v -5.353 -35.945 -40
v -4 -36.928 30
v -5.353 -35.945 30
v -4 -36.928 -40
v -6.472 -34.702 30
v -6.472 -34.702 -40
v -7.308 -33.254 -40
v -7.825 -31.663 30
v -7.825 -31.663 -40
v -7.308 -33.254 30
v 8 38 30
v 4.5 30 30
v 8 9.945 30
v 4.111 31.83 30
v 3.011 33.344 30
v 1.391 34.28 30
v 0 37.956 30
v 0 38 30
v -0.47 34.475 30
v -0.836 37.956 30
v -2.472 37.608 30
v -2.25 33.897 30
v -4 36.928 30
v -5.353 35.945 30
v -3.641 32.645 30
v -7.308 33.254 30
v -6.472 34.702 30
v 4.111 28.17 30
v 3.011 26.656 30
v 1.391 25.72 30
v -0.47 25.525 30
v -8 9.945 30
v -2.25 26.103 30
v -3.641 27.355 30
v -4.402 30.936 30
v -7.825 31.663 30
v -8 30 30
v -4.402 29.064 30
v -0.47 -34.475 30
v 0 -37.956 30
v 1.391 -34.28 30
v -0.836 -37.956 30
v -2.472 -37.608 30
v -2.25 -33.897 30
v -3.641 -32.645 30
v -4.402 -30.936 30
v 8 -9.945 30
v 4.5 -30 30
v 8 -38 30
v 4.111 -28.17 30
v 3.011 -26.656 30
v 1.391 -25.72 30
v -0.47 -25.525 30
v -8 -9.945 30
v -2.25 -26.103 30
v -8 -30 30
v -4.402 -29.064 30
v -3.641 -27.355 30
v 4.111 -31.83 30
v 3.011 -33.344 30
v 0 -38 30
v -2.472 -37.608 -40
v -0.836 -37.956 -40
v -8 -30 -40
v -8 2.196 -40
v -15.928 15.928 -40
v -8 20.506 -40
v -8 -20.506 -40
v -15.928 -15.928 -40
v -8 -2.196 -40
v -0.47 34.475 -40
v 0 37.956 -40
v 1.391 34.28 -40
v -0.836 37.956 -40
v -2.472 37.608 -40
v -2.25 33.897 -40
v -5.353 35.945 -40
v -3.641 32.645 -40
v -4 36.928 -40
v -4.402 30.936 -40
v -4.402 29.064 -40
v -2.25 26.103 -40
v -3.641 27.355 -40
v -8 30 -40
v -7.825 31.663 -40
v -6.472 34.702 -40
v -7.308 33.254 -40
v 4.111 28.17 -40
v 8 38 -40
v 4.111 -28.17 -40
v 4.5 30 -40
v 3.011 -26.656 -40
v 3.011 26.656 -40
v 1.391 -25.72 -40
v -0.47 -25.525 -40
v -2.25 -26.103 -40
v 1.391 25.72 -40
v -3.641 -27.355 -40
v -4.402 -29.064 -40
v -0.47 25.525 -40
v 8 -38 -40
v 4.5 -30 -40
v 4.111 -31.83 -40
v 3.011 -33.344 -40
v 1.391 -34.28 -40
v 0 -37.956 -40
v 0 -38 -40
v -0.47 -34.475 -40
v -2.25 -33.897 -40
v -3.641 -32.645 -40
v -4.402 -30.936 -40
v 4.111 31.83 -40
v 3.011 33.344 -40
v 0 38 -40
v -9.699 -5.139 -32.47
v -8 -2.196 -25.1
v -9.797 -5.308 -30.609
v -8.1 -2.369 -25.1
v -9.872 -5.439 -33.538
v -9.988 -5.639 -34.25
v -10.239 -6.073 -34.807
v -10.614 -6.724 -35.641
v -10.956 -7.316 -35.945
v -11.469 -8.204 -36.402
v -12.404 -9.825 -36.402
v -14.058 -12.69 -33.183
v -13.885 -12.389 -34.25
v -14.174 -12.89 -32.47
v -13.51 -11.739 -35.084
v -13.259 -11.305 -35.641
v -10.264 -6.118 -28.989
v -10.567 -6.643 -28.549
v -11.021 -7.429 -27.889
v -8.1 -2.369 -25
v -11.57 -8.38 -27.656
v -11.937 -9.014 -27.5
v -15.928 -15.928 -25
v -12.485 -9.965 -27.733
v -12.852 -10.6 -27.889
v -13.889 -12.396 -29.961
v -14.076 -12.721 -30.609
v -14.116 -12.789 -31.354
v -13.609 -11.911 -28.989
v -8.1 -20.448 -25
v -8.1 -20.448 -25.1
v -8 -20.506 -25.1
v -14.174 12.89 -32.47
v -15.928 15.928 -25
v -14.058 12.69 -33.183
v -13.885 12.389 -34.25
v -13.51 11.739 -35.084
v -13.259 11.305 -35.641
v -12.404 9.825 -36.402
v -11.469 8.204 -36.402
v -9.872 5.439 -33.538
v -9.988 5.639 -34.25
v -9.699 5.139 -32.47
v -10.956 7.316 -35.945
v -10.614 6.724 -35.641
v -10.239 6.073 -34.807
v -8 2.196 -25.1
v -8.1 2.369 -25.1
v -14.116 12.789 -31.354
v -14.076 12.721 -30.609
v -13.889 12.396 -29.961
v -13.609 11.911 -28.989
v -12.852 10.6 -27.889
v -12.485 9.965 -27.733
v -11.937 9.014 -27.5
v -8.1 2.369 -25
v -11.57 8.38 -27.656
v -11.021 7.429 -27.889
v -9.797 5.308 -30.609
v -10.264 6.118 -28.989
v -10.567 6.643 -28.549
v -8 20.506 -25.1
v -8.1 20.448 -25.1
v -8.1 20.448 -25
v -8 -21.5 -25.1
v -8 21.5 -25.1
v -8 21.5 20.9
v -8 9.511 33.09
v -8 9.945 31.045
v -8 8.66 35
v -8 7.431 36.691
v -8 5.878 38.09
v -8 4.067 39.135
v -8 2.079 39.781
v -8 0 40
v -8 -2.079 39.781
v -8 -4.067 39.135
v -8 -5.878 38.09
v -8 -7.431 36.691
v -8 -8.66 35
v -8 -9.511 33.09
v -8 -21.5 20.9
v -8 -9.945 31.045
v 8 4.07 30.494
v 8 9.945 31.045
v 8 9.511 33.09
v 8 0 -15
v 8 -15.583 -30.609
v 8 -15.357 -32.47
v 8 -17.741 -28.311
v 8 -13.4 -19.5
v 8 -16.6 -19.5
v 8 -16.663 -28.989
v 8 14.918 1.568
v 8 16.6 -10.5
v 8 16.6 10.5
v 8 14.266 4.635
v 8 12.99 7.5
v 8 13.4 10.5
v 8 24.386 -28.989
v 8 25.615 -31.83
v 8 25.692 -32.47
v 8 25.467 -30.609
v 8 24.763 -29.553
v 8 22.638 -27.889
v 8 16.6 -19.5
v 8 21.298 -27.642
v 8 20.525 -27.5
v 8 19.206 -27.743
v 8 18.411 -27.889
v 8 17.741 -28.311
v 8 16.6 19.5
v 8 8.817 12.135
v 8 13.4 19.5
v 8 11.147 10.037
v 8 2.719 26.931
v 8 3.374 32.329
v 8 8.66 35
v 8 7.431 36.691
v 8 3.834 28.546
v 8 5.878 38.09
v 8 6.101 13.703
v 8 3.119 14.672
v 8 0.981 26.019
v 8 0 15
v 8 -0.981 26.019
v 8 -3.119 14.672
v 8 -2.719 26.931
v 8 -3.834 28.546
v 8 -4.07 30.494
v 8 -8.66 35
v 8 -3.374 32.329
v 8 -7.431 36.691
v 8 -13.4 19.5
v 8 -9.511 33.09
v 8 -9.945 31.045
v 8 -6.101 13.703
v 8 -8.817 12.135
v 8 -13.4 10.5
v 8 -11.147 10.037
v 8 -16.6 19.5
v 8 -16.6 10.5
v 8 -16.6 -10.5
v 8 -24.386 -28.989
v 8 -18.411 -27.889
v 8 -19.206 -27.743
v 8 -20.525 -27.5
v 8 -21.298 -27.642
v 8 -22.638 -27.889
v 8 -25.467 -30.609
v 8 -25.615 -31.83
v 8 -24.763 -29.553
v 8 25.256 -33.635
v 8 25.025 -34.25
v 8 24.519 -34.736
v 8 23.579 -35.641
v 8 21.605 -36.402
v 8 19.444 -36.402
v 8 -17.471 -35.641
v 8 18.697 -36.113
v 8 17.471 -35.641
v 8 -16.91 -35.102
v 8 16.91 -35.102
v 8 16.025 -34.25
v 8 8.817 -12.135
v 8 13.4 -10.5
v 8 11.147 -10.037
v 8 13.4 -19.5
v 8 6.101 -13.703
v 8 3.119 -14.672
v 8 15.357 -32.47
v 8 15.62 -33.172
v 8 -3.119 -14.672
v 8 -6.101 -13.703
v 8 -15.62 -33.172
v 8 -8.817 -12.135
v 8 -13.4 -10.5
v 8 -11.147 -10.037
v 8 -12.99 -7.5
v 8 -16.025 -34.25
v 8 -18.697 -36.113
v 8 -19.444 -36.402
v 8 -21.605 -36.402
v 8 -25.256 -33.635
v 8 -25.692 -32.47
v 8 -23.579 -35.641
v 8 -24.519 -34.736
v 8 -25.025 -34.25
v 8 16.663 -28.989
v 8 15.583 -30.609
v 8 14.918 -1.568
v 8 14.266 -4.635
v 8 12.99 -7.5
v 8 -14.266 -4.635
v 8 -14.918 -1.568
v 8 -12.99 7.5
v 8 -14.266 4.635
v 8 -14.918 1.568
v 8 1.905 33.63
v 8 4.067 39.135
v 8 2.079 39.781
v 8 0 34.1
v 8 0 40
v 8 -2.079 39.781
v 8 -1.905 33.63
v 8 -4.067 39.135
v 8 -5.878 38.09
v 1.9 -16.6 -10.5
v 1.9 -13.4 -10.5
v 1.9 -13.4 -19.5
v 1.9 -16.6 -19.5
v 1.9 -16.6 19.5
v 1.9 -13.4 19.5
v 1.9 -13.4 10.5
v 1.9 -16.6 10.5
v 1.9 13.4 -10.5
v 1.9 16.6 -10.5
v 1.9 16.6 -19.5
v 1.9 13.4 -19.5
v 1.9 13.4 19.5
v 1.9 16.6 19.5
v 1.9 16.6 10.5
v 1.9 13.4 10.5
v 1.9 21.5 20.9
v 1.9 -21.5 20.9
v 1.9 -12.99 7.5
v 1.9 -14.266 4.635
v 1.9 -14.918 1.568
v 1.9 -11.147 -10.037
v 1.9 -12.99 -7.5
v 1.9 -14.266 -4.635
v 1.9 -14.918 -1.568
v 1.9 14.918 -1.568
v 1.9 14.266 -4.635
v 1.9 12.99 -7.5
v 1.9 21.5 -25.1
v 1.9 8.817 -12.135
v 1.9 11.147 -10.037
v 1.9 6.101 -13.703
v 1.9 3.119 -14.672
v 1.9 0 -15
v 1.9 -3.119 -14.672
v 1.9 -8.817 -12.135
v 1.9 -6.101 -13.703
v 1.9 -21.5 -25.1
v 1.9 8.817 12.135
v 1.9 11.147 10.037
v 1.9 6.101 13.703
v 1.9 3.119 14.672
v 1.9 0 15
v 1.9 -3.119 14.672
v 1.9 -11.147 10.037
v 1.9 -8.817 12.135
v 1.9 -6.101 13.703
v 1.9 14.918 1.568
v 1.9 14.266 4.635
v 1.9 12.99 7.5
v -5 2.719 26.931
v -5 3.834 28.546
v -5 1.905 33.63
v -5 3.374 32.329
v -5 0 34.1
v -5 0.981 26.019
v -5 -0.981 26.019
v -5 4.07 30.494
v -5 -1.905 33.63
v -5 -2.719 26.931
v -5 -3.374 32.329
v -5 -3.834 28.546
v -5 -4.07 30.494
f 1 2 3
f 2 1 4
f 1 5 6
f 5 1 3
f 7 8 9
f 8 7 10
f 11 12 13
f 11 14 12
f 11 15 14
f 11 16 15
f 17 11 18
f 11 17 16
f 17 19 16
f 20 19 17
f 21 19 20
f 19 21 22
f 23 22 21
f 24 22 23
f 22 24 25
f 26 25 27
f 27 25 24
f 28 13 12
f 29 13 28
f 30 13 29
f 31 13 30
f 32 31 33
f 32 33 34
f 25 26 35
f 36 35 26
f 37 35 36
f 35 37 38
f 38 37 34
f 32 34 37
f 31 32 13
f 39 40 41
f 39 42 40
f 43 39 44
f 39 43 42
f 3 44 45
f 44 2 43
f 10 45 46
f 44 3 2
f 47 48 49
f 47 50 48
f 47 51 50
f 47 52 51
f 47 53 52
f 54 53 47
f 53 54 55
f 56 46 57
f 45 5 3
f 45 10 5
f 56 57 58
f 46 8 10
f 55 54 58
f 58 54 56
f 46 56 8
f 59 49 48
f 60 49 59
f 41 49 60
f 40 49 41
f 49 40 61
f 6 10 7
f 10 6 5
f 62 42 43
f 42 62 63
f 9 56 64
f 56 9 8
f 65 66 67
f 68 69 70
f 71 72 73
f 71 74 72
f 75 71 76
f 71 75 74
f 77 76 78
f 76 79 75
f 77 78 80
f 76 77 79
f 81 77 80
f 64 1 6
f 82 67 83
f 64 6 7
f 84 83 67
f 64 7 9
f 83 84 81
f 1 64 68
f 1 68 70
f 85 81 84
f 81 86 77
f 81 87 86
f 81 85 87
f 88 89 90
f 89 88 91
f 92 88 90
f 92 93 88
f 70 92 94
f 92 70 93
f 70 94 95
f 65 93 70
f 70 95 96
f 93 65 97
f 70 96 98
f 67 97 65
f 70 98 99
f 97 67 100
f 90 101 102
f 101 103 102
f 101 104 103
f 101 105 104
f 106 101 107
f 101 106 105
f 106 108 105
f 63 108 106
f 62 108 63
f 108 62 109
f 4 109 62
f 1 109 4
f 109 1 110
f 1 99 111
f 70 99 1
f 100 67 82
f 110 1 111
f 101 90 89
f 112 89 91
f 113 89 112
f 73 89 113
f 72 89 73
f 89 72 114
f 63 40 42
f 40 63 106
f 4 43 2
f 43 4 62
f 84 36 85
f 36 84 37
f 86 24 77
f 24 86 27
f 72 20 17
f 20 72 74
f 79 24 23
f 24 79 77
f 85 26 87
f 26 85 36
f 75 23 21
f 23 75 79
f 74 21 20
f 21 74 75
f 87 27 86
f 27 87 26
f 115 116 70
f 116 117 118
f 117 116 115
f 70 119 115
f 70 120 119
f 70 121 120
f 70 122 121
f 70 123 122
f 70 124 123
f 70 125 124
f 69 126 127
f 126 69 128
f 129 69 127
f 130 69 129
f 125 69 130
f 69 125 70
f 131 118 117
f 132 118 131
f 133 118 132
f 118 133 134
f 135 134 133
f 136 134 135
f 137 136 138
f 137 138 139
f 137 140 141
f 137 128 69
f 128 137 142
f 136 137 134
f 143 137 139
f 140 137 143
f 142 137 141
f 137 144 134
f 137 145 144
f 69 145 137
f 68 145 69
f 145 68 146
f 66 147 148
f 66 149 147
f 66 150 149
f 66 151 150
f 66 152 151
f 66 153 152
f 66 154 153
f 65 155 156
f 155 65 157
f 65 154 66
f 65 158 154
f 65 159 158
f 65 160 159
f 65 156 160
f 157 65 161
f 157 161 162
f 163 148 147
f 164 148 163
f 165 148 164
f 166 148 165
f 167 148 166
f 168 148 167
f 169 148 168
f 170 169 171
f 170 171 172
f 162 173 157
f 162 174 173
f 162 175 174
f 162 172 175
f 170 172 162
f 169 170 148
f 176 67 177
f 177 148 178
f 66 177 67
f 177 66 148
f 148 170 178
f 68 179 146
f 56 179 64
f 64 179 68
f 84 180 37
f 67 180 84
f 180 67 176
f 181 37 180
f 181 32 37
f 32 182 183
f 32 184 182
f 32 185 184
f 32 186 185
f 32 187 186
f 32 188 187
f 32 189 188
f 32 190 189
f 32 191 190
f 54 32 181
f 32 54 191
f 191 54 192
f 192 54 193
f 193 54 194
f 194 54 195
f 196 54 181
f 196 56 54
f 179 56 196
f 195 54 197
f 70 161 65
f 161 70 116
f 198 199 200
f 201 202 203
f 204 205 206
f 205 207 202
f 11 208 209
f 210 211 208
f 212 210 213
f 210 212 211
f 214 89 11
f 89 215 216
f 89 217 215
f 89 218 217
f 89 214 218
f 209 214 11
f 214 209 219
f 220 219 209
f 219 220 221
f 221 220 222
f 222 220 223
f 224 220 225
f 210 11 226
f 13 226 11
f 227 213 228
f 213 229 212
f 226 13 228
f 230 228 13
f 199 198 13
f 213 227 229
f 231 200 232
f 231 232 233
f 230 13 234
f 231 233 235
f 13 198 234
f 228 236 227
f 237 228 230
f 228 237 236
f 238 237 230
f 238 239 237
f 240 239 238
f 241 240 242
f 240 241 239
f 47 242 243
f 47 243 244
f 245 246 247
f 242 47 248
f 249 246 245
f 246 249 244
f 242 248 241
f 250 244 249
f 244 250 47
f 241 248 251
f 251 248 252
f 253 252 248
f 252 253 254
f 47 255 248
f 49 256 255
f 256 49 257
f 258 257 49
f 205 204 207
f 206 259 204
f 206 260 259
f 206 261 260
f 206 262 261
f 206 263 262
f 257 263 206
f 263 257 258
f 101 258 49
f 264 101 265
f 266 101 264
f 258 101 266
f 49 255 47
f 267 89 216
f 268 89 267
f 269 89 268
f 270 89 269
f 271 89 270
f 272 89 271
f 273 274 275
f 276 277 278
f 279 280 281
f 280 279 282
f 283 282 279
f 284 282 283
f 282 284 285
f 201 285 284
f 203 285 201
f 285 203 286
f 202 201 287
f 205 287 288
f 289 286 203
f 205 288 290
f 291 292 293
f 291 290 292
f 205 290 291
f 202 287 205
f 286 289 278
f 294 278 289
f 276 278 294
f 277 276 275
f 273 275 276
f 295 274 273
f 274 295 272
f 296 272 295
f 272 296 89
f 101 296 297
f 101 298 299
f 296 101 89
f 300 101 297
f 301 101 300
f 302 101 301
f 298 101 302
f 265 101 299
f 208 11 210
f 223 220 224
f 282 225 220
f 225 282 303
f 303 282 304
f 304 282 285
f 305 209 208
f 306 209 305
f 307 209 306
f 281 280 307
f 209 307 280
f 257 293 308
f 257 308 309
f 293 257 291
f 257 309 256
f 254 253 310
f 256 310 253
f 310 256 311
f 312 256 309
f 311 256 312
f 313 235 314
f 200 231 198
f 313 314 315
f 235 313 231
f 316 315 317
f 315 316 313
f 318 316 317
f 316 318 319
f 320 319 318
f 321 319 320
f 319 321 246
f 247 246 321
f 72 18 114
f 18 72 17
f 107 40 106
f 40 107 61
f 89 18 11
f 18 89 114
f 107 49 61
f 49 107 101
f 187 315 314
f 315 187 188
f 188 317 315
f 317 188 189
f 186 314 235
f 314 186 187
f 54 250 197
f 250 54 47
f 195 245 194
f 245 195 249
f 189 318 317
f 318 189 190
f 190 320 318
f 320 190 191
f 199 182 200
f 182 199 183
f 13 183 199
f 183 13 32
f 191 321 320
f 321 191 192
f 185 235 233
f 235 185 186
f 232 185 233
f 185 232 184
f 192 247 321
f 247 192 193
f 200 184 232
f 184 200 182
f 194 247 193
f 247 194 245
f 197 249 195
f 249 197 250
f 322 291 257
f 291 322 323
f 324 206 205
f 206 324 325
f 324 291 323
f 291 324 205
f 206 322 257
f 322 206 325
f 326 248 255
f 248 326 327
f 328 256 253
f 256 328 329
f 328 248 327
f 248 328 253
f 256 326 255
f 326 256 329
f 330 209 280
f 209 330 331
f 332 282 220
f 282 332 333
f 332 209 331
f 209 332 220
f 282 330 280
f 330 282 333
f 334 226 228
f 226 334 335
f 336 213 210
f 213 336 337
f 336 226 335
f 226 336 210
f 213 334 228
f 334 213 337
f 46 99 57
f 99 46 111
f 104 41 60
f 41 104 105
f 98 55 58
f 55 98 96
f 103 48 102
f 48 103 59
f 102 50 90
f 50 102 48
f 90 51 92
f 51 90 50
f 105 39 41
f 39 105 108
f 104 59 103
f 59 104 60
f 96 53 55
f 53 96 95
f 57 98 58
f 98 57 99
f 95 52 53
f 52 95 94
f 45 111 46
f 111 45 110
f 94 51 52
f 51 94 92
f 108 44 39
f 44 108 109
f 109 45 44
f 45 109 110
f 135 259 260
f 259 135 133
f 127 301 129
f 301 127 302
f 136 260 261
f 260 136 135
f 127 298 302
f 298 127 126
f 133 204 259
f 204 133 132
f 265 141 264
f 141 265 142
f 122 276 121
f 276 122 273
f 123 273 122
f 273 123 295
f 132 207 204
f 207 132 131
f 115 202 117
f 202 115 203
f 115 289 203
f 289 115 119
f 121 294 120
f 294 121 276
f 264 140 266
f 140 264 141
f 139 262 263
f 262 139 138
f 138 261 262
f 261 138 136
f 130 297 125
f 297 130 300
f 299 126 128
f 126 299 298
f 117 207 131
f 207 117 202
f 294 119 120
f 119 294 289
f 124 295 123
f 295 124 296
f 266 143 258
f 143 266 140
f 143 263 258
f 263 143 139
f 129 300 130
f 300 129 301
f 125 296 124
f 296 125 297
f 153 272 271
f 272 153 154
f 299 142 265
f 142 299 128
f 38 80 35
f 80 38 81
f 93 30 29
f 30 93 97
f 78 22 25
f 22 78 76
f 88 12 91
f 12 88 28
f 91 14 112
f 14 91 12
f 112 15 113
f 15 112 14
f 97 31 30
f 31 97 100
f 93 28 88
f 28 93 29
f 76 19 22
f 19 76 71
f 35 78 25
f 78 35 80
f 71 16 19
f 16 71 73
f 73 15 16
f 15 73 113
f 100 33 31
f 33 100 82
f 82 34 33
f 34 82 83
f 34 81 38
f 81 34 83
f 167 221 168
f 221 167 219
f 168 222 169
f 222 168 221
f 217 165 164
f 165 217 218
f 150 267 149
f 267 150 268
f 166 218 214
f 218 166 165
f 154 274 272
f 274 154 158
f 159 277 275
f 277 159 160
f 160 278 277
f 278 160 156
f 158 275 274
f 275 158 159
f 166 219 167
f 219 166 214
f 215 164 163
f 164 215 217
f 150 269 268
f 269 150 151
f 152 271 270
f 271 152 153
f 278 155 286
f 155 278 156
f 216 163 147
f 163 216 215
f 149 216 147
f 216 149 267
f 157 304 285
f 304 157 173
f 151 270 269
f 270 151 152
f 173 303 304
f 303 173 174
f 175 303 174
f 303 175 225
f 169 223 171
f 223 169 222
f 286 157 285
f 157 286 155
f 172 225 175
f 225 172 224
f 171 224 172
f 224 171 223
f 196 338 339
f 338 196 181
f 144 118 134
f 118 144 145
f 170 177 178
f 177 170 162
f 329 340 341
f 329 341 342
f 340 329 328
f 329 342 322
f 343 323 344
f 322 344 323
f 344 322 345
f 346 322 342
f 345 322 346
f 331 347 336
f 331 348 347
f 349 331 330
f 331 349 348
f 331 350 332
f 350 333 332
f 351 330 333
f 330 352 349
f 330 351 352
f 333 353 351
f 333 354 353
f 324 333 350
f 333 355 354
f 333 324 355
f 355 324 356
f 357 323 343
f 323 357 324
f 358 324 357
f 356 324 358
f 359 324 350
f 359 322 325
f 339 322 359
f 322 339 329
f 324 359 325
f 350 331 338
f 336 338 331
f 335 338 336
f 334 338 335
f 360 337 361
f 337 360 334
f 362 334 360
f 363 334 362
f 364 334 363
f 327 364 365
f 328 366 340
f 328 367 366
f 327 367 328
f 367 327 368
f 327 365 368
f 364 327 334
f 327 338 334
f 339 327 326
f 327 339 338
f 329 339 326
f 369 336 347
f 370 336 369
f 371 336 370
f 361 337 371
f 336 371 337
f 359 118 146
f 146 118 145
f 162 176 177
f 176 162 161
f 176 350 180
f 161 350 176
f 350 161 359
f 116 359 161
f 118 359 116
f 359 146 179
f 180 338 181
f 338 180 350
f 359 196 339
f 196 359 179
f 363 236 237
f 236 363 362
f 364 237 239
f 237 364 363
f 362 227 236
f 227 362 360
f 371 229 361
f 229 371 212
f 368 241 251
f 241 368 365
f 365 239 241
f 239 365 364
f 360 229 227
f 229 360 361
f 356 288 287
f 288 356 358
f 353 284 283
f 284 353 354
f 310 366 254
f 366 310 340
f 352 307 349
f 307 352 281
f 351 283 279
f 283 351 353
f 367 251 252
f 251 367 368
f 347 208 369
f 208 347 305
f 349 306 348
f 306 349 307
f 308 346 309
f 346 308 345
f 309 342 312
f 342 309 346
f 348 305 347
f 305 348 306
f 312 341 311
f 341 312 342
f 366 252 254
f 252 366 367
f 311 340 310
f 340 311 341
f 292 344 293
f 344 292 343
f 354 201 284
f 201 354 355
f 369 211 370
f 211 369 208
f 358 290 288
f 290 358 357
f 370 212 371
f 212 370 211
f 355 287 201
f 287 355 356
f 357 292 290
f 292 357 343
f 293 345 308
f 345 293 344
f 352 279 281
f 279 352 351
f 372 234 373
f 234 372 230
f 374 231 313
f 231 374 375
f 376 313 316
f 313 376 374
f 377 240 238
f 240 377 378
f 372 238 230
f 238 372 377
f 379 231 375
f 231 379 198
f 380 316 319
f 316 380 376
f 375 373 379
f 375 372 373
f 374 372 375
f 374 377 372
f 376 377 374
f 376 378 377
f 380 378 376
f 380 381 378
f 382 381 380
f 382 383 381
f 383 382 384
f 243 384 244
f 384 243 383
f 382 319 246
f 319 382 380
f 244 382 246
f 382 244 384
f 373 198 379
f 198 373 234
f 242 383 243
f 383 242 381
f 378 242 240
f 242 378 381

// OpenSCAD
// PRUSA Mendel  
// Z motor mount -- Used for mounting Z motors
// GNU GPL v2
// Josef Průša
// josefprusa@me.com
// prusadjs.cz
// Clean up by Christopher Olah <christopherolah.co@gmail.com>
// http://www.reprap.org/wiki/Prusa_Mendel
// http://github.com/prusajr/PrusaMendel

rotate([0,-90,0]) difference(){
	// Main body:
	union(){

		translate([-5,0,0]) cube(size = [70,60,16], center = true);
		translate([-5,0,-4]) cube(size = [70,76,8], center = true);
		translate ([30,0,-8]) cylinder(h=16,r=10);
		for (y=[-1,1])  translate ([-40,30*y,0]) rotate([0,90,0]) cylinder(h = 70, r=8, $fn=30);
		for (y=[-1,1]) translate ([-32.5,13*y,5]) rotate([30*y,0,0]) cube(size=[15.,16,16],center=true);
	}
	// Motor sits in this
	translate([-2.1,0,3.1]) cube(size = [46,43,10], center = true);
	// And goes through this
	translate([0,0,-20]) cylinder(h = 40, r=15);
	//The vertical rod goes through here
	translate([30,0,-45]) cylinder(h = 50, r=4.1);
	for (y=[-1,1]) {
		//top rods:
		translate([-50,30*y,0]) rotate([0,90,0]) cylinder(h = 100, r=4.5);
		//motor screw holes
		for (x=[-1,1]) translate([15*x,15*y,0]) cube(size = [9,3.2,25], center = true);
		//diagonal rods
		translate([-32,39*y,-40]) rotate([30*y,0,0]) cylinder (h=100,r=4.5);
	}


}
